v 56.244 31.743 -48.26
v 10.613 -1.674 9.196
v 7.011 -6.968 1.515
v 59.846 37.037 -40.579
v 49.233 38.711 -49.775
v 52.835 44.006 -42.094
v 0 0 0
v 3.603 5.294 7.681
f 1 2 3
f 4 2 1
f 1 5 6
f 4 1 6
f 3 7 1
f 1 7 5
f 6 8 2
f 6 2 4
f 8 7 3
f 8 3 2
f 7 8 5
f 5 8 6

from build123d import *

# Parameters (mm, degrees)
BOX_W               = 80
BOX_H               = 10
BOX_DEPTH           = 10
BOX_ROLL_ANGLE      = 78.842738
BOX_PITCH_ANGLE     = 38.475947
BOX_PLACEMENT_ANGLE = 38.177648


with BuildPart() as part:
    # Box → Box (new body)
    with BuildSketch(Plane.XY):
        with Locations((40, 5)):
            Rectangle(BOX_W, BOX_H)
    extrude(amount=BOX_DEPTH)


with BuildPart() as part_1:
    # Box roll: moved
    add(part.part.rotate(Axis((0, 0, 0), (1, 0, 0)), BOX_ROLL_ANGLE))


with BuildPart() as part_2:
    # Box pitch: moved
    add(part_1.part.rotate(Axis((0, 0, 0), (0, 1, 0)), BOX_PITCH_ANGLE))


with BuildPart() as part_3:
    # Box placement: moved
    add(part_2.part.rotate(Axis((0, 0, 0), (0, 0, 1)), BOX_PLACEMENT_ANGLE))


solid = part_3.part
